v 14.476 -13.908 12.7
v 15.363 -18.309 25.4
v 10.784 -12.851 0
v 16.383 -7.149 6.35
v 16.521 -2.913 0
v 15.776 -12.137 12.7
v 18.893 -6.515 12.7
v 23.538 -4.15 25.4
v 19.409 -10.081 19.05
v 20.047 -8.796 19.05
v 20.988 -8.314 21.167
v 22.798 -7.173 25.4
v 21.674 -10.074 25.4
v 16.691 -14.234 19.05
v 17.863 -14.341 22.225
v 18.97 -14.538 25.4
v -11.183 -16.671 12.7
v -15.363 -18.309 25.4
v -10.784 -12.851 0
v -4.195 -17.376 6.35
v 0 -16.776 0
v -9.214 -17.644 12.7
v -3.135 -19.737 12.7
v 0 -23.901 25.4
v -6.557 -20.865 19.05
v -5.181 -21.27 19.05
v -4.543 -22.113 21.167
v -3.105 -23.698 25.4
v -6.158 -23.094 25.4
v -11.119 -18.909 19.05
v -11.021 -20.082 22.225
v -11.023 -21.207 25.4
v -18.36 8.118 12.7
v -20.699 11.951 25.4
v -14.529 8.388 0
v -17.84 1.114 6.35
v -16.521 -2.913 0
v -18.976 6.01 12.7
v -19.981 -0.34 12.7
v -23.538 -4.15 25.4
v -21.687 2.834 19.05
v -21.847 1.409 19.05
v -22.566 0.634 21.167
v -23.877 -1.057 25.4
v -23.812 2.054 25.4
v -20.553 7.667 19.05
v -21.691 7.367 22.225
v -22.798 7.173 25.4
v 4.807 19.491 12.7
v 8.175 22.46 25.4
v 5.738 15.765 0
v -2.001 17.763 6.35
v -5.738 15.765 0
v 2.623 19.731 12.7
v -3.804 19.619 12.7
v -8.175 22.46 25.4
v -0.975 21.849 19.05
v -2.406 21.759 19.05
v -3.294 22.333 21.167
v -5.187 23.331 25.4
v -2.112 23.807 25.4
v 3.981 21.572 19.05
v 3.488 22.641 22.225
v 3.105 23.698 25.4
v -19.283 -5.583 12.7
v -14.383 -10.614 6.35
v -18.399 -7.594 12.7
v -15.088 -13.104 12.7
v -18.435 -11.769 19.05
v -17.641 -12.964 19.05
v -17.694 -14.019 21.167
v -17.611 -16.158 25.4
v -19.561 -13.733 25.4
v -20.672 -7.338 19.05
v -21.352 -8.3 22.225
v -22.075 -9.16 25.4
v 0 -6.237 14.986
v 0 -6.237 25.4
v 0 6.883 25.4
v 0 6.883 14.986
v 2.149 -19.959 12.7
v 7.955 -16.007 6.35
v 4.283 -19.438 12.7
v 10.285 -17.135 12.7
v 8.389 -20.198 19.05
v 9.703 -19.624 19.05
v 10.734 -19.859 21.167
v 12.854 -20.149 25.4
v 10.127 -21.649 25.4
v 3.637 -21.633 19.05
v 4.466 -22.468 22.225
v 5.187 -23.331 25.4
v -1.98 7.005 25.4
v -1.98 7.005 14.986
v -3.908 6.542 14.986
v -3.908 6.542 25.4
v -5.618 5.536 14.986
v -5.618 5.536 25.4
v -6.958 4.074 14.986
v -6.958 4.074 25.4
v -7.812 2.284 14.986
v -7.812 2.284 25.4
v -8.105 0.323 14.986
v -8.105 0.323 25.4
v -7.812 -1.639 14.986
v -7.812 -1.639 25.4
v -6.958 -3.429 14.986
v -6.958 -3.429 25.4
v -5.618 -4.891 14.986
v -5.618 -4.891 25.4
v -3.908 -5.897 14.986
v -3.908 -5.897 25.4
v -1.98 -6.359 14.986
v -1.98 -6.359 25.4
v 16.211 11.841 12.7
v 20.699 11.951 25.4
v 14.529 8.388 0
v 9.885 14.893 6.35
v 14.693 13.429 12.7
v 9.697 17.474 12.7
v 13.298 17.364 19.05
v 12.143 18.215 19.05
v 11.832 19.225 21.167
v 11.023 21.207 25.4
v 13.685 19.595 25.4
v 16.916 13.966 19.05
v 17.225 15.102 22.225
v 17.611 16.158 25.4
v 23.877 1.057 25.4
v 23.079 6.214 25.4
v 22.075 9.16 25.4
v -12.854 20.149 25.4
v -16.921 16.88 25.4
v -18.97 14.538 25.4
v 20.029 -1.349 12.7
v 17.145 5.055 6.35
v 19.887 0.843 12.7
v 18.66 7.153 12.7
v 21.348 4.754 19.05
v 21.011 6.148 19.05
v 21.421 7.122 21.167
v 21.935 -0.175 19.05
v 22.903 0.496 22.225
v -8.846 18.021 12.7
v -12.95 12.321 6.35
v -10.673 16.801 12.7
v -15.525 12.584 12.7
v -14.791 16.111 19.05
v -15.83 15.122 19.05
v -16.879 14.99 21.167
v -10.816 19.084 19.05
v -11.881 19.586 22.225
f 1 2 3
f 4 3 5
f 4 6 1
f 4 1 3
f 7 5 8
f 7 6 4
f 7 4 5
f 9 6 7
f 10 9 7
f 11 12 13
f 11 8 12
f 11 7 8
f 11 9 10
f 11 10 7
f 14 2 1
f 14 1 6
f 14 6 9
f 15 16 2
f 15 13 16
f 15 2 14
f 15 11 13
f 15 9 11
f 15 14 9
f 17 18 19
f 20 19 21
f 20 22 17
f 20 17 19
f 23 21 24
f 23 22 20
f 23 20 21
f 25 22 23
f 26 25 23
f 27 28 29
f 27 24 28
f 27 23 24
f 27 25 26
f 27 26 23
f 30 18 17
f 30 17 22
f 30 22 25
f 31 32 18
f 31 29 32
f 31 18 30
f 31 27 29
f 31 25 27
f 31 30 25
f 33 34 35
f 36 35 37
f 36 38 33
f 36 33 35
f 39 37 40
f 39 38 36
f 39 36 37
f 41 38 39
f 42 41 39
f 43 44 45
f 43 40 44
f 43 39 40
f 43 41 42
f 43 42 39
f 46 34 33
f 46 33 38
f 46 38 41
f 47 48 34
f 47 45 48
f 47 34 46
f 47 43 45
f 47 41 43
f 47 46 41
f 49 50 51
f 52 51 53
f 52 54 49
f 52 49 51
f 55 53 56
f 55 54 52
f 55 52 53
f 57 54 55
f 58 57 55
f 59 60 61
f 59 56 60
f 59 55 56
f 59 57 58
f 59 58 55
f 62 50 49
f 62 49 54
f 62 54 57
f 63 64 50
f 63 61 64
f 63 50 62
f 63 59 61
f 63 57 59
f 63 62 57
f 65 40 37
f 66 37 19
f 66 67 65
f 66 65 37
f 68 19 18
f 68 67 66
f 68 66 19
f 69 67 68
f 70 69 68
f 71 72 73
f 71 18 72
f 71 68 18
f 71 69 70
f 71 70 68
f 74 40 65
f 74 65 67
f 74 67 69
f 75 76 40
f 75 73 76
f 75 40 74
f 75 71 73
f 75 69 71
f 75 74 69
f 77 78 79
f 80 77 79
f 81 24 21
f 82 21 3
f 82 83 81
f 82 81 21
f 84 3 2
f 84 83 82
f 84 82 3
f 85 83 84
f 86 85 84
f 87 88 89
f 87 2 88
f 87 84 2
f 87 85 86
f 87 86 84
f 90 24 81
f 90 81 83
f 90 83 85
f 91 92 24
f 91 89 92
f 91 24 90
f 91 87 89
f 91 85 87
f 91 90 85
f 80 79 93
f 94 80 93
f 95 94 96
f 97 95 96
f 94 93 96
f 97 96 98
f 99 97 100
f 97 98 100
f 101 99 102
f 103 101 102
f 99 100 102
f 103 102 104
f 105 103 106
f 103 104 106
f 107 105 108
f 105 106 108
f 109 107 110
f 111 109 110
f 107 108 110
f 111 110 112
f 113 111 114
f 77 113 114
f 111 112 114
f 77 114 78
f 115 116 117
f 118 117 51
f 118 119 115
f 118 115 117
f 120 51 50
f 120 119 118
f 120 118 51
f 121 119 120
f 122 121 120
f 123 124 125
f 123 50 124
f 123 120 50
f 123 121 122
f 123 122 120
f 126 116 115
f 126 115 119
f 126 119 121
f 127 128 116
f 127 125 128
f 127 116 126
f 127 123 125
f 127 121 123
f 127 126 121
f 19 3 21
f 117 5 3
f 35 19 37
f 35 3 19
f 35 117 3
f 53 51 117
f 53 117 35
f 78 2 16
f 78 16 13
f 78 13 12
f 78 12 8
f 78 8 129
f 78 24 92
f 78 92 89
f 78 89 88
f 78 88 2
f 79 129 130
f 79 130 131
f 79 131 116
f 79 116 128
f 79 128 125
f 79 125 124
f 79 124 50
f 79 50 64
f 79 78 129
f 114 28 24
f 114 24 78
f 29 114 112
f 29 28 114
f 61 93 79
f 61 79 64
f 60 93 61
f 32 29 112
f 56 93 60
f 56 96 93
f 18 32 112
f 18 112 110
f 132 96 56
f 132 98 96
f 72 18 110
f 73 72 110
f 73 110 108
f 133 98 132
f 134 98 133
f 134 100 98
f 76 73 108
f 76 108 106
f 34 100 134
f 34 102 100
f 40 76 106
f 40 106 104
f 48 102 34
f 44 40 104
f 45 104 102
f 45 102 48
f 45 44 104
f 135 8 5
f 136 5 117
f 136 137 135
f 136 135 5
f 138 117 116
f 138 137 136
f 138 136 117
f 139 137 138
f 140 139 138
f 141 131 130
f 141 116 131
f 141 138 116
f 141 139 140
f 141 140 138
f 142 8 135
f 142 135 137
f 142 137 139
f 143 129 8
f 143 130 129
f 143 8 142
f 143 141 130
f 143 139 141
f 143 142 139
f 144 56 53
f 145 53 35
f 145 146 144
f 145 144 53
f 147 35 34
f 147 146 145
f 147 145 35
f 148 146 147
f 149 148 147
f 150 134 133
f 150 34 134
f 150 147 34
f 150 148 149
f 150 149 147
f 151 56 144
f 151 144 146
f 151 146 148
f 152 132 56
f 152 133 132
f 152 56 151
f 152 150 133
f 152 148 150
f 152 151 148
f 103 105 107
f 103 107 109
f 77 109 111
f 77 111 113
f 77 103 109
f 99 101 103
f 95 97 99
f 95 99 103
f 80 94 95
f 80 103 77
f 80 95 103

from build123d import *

# Parameters (mm, degrees)
F5_DEPTH = 10.414


# Not quite as in the source:
# - the arcs of a loft's sections are written as splines that run evenly, so that the points pair up as in the source's solid


with BuildPart() as f3:
    # F0 (on Top) → F3 section 0
    with BuildSketch(Plane.XY):
        Polygon((10.7835912141, -12.8513835704), (16.5214202528, -2.9131721502), (14.5286931401, 8.3881448954), (5.7378290387, 15.7645557206), (-5.7378290387, 15.7645557206), (-14.5286931401, 8.3881448954), (-16.5214202528, -2.9131721502), (-10.7835912141, -12.8513835704), (0, -16.7762897909), align=None)
    # F2 (on offset) → F3 section 1
    with BuildSketch(Plane.XY.offset(25.4)):
        with BuildLine():
            add(Edge.make_bspline(
                [(15.363307355, -18.3092767345), (17.4936884395, -16.5216747522), (19.3084205069, -14.3589612913), (22.0894355037, -9.5421020203), (23.0550342683, -6.8891412184), (23.5379524545, -4.1503760884)],
                knots=[0, 0, 0, 0, 0.5, 0.5, 1, 1, 1, 1], degree=3))
            add(Edge.make_bspline(
                [(23.5379524545, -4.1503760884), (24.0208706408, -1.4116109583), (24.0208706408, 1.4116109583), (23.0550342683, 6.8891412184), (22.0894355037, 9.5421020203), (20.6989280053, 11.9505316558)],
                knots=[0, 0, 0, 0, 0.5, 0.5, 1, 1, 1, 1], degree=3))
            add(Edge.make_bspline(
                [(20.6989280053, 11.9505316558), (19.3084205069, 14.3589612913), (17.4936884395, 16.5216747522), (13.2329262705, 20.0968787168), (10.7879443702, 21.5084896751), (8.1746450995, 22.4596528229)],
                knots=[0, 0, 0, 0, 0.5, 0.5, 1, 1, 1, 1], degree=3))
            add(Edge.make_bspline(
                [(8.1746450995, 22.4596528229), (5.5613458287, 23.4108159707), (2.7810149968, 23.9010633116), (-2.7810149968, 23.9010633116), (-5.5613458287, 23.4108159707), (-8.1746450995, 22.4596528229)],
                knots=[0, 0, 0, 0, 0.5, 0.5, 1, 1, 1, 1], degree=3))
            add(Edge.make_bspline(
                [(-8.1746450995, 22.4596528229), (-10.7879443702, 21.5084896751), (-13.2329262705, 20.0968787168), (-17.4936884395, 16.5216747522), (-19.3084205069, 14.3589612913), (-20.6989280053, 11.9505316558)],
                knots=[0, 0, 0, 0, 0.5, 0.5, 1, 1, 1, 1], degree=3))
            add(Edge.make_bspline(
                [(-20.6989280053, 11.9505316558), (-22.0894355037, 9.5421020203), (-23.0550342683, 6.8891412184), (-24.0208706408, 1.4116109583), (-24.0208706408, -1.4116109583), (-23.5379524545, -4.1503760884)],
                knots=[0, 0, 0, 0, 0.5, 0.5, 1, 1, 1, 1], degree=3))
            add(Edge.make_bspline(
                [(-23.5379524545, -4.1503760884), (-23.0550342683, -6.8891412184), (-22.0894355037, -9.5421020203), (-19.3084205069, -14.3589612913), (-17.4936884395, -16.5216747522), (-15.363307355, -18.3092767345)],
                knots=[0, 0, 0, 0, 0.5, 0.5, 1, 1, 1, 1], degree=3))
            add(Edge.make_bspline(
                [(-15.363307355, -18.3092767345), (-13.2329262705, -20.0968787168), (-10.7879443702, -21.5084896751), (-5.5613458287, -23.4108159707), (-2.7810149968, -23.9010633116), (0, -23.9010633116)],
                knots=[0, 0, 0, 0, 0.5, 0.5, 1, 1, 1, 1], degree=3))
            add(Edge.make_bspline(
                [(0, -23.9010633116), (2.7810149968, -23.9010633116), (5.5613458287, -23.4108159707), (10.7879443702, -21.5084896751), (13.2329262705, -20.0968787168), (15.363307355, -18.3092767345)],
                knots=[0, 0, 0, 0, 0.5, 0.5, 1, 1, 1, 1], degree=3))
        make_face()
    loft(ruled=True)

    # F4 (on face) → F5 (cut)
    with BuildSketch(Plane.XY.offset(25.4)):
        with BuildLine():
            Line((0, -6.2373387627), (0, 6.8825809285))
            ThreePointArc((0, 6.8825809285), (-8.1053000761, 0.3226210829), (0, -6.2373387627))
        make_face()
    extrude(amount=-F5_DEPTH, mode=Mode.SUBTRACT)


solid = f3.part
